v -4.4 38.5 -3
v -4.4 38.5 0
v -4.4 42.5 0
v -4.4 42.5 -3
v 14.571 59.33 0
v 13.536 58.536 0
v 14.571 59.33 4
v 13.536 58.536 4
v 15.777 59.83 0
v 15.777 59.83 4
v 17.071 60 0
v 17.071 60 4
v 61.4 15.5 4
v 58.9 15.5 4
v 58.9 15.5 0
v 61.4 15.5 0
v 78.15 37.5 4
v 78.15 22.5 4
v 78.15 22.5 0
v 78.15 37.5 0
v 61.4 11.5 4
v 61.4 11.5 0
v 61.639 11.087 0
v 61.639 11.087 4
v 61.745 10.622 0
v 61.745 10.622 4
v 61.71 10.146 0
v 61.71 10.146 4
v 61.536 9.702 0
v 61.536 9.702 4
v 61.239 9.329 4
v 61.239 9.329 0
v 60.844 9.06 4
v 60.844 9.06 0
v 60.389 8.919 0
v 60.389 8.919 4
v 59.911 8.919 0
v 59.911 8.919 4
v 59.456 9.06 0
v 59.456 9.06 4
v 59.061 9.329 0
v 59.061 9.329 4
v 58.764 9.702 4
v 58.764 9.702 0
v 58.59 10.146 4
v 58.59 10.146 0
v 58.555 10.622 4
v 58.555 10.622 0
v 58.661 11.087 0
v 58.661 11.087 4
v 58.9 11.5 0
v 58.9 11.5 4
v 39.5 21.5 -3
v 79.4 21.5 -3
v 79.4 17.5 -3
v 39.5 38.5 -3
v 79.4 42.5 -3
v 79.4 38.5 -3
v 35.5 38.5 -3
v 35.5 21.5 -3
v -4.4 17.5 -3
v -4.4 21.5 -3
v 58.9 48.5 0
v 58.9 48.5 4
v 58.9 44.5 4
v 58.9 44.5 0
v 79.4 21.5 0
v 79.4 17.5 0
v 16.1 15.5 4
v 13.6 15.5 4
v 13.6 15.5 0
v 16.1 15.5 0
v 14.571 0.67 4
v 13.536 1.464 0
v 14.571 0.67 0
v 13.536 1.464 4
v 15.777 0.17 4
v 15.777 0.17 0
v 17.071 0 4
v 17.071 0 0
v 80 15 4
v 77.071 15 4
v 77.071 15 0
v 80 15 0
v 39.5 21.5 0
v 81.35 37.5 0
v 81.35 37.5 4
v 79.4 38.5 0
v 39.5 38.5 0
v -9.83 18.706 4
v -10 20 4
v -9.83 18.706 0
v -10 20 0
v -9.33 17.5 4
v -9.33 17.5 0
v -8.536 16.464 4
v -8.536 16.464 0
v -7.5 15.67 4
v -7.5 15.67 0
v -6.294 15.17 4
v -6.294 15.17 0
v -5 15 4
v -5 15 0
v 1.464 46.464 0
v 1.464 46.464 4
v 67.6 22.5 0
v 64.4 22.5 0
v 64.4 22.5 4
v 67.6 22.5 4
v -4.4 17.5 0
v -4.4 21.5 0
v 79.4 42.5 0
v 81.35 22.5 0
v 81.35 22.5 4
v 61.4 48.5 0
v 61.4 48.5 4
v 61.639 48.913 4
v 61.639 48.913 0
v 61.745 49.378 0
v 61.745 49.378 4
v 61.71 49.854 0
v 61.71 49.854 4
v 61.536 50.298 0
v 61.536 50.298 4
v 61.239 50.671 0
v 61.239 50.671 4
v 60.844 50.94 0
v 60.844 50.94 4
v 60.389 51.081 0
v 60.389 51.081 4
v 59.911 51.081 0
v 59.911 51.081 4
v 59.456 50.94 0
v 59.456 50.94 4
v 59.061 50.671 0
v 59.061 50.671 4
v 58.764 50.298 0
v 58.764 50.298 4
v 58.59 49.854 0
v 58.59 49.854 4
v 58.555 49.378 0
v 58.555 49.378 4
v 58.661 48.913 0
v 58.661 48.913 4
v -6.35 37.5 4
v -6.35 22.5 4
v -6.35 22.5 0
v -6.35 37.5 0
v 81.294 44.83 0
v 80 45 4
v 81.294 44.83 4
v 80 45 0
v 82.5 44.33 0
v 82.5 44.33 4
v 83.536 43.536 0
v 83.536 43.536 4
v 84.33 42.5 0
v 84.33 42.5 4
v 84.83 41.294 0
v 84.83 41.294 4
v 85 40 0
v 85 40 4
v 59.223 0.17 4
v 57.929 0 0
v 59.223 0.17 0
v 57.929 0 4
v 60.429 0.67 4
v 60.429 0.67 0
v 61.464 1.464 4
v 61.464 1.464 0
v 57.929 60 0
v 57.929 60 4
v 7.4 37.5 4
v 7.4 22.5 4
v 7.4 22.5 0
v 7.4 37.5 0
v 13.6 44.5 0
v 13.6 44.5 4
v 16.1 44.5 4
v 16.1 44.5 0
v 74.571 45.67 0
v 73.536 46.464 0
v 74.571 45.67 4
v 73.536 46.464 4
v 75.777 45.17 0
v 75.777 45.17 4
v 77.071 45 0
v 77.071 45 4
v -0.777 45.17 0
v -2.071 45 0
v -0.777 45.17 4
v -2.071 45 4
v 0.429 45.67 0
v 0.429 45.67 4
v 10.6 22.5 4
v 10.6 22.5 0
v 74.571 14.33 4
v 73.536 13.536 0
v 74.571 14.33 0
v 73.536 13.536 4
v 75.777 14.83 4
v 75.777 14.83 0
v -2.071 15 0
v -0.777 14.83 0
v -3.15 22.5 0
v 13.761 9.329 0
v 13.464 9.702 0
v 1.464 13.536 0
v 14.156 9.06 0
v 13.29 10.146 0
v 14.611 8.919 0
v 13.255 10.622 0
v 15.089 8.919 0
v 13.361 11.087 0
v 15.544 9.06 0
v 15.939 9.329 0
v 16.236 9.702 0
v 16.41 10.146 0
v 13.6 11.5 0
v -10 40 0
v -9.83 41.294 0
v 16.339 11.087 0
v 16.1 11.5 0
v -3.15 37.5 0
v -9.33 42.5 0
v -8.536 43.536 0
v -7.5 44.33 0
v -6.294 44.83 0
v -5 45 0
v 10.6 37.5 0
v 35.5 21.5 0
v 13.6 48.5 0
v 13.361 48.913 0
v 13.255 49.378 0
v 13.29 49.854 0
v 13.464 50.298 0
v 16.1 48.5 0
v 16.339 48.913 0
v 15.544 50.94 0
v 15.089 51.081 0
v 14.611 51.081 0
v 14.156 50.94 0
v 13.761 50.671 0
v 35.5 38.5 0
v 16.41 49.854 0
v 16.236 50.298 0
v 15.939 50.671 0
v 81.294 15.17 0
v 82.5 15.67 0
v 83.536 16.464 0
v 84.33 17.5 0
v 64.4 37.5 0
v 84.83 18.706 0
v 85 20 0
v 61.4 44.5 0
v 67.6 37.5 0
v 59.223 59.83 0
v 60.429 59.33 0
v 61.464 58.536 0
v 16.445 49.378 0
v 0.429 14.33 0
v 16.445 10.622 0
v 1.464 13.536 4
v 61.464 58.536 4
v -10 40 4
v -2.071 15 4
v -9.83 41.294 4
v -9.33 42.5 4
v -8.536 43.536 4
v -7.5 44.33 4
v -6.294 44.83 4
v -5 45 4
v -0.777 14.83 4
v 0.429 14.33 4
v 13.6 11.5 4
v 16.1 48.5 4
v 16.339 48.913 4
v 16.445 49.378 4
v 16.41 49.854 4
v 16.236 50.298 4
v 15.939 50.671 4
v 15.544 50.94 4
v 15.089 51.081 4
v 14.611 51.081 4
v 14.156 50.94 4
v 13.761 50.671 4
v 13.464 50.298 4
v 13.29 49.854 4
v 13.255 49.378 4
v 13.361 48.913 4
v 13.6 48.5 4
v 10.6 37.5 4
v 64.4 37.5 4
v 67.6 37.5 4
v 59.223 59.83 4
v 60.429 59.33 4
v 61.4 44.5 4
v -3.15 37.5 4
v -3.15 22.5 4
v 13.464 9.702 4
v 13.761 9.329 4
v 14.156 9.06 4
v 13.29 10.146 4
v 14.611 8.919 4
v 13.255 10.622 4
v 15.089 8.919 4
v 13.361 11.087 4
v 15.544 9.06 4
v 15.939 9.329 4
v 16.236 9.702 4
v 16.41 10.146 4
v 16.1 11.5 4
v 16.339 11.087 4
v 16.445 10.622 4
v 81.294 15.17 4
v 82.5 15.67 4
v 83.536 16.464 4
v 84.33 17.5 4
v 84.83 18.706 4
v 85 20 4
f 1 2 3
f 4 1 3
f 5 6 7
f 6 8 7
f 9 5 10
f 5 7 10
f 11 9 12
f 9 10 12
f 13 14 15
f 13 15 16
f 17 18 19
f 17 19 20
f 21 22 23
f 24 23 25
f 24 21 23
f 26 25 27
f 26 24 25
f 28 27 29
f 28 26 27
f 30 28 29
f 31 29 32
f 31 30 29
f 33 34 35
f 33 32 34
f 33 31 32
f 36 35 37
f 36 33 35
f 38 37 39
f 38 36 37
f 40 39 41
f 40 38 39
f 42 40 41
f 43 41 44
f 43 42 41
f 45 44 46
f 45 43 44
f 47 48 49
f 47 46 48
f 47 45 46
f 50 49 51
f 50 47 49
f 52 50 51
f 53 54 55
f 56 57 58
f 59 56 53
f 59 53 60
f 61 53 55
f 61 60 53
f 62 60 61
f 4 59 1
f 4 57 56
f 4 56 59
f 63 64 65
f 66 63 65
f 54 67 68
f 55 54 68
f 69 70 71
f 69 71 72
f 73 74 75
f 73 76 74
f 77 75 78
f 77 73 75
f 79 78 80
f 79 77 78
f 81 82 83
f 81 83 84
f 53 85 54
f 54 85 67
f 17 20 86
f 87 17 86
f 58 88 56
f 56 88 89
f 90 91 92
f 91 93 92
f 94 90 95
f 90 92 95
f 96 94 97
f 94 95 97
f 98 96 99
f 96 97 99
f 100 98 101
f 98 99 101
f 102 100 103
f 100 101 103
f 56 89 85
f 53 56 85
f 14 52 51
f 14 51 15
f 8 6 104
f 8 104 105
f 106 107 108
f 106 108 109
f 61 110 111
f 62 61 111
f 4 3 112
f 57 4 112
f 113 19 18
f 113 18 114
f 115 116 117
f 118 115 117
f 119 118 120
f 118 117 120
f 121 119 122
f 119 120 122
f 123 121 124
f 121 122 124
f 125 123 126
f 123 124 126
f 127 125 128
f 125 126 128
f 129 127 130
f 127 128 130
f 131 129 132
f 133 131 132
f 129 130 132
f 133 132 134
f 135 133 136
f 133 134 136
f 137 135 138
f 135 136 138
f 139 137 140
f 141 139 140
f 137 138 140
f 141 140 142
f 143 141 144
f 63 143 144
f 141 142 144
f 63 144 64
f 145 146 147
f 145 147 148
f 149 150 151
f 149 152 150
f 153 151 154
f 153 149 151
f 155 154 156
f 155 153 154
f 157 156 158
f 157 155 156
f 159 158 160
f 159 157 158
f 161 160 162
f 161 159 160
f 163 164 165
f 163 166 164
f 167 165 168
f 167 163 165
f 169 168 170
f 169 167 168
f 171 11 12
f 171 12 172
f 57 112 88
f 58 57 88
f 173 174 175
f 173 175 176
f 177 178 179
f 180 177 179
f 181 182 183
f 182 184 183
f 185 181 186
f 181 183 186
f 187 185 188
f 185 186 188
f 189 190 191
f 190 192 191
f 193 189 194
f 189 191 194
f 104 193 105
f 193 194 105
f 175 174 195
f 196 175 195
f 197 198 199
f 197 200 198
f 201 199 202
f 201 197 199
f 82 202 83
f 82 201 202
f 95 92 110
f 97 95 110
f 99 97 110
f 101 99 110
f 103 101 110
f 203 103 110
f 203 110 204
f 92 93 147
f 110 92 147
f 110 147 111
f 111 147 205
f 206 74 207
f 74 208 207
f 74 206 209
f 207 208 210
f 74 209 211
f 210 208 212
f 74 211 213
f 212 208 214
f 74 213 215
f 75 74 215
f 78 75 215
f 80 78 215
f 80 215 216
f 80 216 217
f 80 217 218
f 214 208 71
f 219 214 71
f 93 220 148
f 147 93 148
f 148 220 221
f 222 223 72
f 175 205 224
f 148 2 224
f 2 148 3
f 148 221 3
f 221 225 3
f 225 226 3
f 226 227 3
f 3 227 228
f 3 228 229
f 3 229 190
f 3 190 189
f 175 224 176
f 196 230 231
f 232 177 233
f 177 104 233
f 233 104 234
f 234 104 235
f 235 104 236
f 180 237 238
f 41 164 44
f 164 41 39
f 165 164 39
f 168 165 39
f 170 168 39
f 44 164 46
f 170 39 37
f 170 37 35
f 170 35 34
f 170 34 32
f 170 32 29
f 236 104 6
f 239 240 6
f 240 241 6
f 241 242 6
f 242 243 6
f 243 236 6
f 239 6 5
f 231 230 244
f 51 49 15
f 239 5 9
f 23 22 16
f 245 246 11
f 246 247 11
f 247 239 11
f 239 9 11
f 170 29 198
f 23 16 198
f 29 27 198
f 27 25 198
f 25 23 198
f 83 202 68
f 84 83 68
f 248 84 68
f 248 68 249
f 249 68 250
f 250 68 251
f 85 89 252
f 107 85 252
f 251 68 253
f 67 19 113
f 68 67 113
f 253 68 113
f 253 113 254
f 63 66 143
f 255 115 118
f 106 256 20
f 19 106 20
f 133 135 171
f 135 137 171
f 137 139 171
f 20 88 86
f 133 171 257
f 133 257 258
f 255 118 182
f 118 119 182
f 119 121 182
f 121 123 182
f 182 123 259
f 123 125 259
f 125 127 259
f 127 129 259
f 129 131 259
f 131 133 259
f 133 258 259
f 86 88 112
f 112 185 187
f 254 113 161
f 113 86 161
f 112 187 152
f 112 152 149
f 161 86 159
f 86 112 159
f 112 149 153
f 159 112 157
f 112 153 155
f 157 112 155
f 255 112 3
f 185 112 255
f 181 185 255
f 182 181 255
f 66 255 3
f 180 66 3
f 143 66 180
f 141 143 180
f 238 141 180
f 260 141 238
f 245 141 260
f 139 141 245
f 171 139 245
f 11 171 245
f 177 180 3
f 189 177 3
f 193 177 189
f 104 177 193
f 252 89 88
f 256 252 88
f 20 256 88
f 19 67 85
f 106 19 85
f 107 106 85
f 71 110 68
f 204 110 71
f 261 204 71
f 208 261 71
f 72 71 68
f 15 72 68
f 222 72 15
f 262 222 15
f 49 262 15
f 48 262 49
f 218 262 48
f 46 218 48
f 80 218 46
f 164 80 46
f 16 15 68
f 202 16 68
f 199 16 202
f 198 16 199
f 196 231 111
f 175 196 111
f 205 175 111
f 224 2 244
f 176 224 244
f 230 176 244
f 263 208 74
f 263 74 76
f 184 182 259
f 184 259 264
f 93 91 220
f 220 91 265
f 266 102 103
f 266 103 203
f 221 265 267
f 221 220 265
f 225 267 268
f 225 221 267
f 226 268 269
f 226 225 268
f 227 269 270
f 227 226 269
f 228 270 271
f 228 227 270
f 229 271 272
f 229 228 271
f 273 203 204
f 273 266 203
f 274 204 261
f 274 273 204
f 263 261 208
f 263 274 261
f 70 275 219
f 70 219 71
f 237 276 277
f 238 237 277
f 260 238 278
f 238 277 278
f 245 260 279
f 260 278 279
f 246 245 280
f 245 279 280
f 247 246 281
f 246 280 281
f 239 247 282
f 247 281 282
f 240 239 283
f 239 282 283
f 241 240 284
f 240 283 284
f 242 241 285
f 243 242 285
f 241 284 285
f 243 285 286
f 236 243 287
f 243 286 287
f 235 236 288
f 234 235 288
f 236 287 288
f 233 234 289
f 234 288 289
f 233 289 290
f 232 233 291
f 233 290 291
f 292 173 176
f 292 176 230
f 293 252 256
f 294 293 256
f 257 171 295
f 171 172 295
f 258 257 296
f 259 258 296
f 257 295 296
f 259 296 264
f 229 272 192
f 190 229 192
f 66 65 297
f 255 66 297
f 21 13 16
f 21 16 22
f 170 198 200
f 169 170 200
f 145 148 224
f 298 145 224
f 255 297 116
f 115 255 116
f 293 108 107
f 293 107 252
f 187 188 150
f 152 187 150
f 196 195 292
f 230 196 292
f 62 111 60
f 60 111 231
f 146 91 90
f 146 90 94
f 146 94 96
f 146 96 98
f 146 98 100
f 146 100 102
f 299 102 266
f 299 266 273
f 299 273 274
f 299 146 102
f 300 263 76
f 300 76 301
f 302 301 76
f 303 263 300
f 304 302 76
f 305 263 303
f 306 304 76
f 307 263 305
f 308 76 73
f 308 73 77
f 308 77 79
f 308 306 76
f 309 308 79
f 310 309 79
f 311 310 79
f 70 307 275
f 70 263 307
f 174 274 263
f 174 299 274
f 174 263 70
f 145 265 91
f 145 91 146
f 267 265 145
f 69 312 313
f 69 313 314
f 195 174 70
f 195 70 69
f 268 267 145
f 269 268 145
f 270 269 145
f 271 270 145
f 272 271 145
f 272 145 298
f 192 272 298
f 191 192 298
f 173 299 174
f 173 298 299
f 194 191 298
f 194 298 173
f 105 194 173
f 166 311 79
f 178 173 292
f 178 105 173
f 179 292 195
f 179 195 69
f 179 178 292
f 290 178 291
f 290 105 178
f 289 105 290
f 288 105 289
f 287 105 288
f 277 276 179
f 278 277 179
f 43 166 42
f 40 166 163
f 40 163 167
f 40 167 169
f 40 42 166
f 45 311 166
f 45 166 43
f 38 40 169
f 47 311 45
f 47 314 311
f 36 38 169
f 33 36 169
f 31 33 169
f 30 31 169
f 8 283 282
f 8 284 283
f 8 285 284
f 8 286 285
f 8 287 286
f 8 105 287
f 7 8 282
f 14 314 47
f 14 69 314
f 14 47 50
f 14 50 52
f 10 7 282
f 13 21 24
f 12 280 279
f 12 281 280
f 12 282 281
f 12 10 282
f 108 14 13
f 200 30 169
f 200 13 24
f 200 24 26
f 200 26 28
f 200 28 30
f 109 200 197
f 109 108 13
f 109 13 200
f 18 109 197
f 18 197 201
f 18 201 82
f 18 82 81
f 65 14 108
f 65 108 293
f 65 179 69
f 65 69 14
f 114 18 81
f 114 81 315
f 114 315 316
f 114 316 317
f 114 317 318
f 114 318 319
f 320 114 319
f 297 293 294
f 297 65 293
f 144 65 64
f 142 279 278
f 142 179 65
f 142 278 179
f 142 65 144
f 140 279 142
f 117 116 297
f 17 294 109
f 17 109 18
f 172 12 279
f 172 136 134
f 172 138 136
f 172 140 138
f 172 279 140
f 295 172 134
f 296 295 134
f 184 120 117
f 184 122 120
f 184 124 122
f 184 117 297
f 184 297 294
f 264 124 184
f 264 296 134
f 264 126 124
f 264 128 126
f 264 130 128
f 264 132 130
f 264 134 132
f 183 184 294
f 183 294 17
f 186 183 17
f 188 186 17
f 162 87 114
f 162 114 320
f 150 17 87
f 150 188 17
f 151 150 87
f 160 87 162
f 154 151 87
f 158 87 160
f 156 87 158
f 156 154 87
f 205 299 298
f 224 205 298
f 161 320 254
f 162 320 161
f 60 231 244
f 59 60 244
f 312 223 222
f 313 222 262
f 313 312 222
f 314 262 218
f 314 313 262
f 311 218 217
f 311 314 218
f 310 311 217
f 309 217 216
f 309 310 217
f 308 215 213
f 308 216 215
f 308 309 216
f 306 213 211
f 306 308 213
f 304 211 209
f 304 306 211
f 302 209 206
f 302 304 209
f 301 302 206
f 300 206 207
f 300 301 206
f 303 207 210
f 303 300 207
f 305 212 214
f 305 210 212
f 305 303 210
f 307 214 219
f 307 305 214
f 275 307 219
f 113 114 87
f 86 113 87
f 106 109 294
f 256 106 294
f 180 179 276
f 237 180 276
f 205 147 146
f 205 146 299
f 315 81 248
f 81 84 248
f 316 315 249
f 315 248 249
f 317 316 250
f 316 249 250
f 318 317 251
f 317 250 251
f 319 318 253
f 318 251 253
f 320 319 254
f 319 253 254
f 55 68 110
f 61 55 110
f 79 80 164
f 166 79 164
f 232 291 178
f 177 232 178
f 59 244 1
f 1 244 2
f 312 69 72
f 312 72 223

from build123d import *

# Parameters (mm, degrees)
SKETCH_1_W          = 75
SKETCH_1_H          = 60
EXTRUDE_1_DEPTH     = 4
SKETCH_2_W          = 3.2
SKETCH_2_H          = 15
CUT_EXTRUDE_1_DEPTH = 97.13012015
CUT_EXTRUDE_2_DEPTH = 97.13012015
CHAMFER_1_SIZE      = 15
SKETCH_7_W          = 10
SKETCH_7_H          = 30
EXTRUDE_3_DEPTH     = 4
SKETCH_8_W          = 3.2
SKETCH_8_H          = 15
CUT_EXTRUDE_5_DEPTH = 105.120122935
FILLET_1_R          = 5
EXTRUDE_2_DEPTH     = 3


with BuildPart() as part:
    # 草图1 → 凸台-拉伸1 (new body)
    with BuildSketch(Plane.XY):
        with Locations((37.5, 30)):
            Rectangle(SKETCH_1_W, SKETCH_1_H)
    extrude(amount=EXTRUDE_1_DEPTH)

    # 草图2 → 切除-拉伸1 (cut, through all)
    with BuildSketch(Plane.XY.offset(4)):
        with Locations((66, 30)):
            Rectangle(SKETCH_2_W, SKETCH_2_H)
        with Locations((9, 30)):
            Rectangle(SKETCH_2_W, SKETCH_2_H)
    extrude(amount=-CUT_EXTRUDE_1_DEPTH, mode=Mode.SUBTRACT)

    # 草图3 → 切除-拉伸2 (cut, through all)
    with BuildSketch(Plane.XY.offset(4)):
        with BuildLine():
            Line((58.9, 48.5), (58.9, 44.5))
            Line((58.9, 44.5), (61.4, 44.5))
            Line((61.4, 44.5), (61.4, 48.5))
            ThreePointArc((61.4, 48.5), (60.15, 51.098749218), (58.9, 48.5))
        make_face()
        with BuildLine():
            Line((58.9, 15.5), (61.4, 15.5))
            Line((61.4, 15.5), (61.4, 11.5))
            ThreePointArc((61.4, 11.5), (60.15, 8.901250782), (58.9, 11.5))
            Line((58.9, 11.5), (58.9, 15.5))
        make_face()
        with BuildLine():
            Line((16.1, 15.5), (16.1, 11.5))
            ThreePointArc((16.1, 11.5), (14.85, 8.901250782), (13.6, 11.5))
            Line((13.6, 11.5), (13.6, 15.5))
            Line((13.6, 15.5), (16.1, 15.5))
        make_face()
        with BuildLine():
            Line((13.6, 48.5), (13.6, 44.5))
            Line((13.6, 44.5), (16.1, 44.5))
            Line((16.1, 44.5), (16.1, 48.5))
            ThreePointArc((16.1, 48.5), (14.85, 51.098749218), (13.6, 48.5))
        make_face()
    extrude(amount=-CUT_EXTRUDE_2_DEPTH, mode=Mode.SUBTRACT)

    # 倒角1
    chamfer_1_edges = [part.edges().sort_by_distance(p)[0] for p in [
        (0, 60, 2),
        (75, 60, 2),
        (75, 0, 2),
        (0, 0, 2),
    ]]
    chamfer(chamfer_1_edges, length=CHAMFER_1_SIZE)

    # 草图7 → 凸台-拉伸3 (add)
    with BuildSketch(Plane.XY.offset(4)):
        with Locations((-5, 30)):
            Rectangle(SKETCH_7_W, SKETCH_7_H)
        with Locations((80, 30)):
            Rectangle(SKETCH_7_W, SKETCH_7_H)
    extrude(amount=-EXTRUDE_3_DEPTH)

    # 草图8 → 切除-拉伸5 (cut, through all)
    with BuildSketch(Plane.XY.offset(4)):
        with Locations((79.75, 30)):
            Rectangle(SKETCH_8_W, SKETCH_8_H)
        with Locations((-4.75, 30)):
            Rectangle(SKETCH_8_W, SKETCH_8_H)
    extrude(amount=-CUT_EXTRUDE_5_DEPTH, mode=Mode.SUBTRACT)

    # 圆角1
    fillet_1_edges = [part.edges().sort_by_distance(p)[0] for p in [
        (0, 15, 2),
        (0, 45, 2),
        (60, 60, 2),
        (15, 60, 2),
        (75, 45, 2),
        (75, 15, 2),
        (15, 0, 2),
        (60, 0, 2),
        (-10, 45, 2),
        (-10, 15, 2),
        (85, 15, 2),
        (85, 45, 2),
    ]]
    fillet(fillet_1_edges, radius=FILLET_1_R)

    # 草图5 → 凸台-拉伸2 (add)
    with BuildSketch(Plane(origin=(0, 0, 0), x_dir=(-1, 0, 0), z_dir=(0, 0, -1))):
        Polygon((-37.5, 42.5), (-79.4, 42.5), (-79.4, 38.5), (-39.5, 38.5), (-39.5, 21.5), (-79.4, 21.5), (-79.4, 17.5), (-37.5, 17.5), align=None)
        Polygon((4.4, 42.5), (-37.5, 42.5), (-37.5, 17.5), (4.4, 17.5), (4.4, 21.5), (-35.5, 21.5), (-35.5, 38.5), (4.4, 38.5), align=None)
    extrude(amount=EXTRUDE_2_DEPTH)


solid = part.part
